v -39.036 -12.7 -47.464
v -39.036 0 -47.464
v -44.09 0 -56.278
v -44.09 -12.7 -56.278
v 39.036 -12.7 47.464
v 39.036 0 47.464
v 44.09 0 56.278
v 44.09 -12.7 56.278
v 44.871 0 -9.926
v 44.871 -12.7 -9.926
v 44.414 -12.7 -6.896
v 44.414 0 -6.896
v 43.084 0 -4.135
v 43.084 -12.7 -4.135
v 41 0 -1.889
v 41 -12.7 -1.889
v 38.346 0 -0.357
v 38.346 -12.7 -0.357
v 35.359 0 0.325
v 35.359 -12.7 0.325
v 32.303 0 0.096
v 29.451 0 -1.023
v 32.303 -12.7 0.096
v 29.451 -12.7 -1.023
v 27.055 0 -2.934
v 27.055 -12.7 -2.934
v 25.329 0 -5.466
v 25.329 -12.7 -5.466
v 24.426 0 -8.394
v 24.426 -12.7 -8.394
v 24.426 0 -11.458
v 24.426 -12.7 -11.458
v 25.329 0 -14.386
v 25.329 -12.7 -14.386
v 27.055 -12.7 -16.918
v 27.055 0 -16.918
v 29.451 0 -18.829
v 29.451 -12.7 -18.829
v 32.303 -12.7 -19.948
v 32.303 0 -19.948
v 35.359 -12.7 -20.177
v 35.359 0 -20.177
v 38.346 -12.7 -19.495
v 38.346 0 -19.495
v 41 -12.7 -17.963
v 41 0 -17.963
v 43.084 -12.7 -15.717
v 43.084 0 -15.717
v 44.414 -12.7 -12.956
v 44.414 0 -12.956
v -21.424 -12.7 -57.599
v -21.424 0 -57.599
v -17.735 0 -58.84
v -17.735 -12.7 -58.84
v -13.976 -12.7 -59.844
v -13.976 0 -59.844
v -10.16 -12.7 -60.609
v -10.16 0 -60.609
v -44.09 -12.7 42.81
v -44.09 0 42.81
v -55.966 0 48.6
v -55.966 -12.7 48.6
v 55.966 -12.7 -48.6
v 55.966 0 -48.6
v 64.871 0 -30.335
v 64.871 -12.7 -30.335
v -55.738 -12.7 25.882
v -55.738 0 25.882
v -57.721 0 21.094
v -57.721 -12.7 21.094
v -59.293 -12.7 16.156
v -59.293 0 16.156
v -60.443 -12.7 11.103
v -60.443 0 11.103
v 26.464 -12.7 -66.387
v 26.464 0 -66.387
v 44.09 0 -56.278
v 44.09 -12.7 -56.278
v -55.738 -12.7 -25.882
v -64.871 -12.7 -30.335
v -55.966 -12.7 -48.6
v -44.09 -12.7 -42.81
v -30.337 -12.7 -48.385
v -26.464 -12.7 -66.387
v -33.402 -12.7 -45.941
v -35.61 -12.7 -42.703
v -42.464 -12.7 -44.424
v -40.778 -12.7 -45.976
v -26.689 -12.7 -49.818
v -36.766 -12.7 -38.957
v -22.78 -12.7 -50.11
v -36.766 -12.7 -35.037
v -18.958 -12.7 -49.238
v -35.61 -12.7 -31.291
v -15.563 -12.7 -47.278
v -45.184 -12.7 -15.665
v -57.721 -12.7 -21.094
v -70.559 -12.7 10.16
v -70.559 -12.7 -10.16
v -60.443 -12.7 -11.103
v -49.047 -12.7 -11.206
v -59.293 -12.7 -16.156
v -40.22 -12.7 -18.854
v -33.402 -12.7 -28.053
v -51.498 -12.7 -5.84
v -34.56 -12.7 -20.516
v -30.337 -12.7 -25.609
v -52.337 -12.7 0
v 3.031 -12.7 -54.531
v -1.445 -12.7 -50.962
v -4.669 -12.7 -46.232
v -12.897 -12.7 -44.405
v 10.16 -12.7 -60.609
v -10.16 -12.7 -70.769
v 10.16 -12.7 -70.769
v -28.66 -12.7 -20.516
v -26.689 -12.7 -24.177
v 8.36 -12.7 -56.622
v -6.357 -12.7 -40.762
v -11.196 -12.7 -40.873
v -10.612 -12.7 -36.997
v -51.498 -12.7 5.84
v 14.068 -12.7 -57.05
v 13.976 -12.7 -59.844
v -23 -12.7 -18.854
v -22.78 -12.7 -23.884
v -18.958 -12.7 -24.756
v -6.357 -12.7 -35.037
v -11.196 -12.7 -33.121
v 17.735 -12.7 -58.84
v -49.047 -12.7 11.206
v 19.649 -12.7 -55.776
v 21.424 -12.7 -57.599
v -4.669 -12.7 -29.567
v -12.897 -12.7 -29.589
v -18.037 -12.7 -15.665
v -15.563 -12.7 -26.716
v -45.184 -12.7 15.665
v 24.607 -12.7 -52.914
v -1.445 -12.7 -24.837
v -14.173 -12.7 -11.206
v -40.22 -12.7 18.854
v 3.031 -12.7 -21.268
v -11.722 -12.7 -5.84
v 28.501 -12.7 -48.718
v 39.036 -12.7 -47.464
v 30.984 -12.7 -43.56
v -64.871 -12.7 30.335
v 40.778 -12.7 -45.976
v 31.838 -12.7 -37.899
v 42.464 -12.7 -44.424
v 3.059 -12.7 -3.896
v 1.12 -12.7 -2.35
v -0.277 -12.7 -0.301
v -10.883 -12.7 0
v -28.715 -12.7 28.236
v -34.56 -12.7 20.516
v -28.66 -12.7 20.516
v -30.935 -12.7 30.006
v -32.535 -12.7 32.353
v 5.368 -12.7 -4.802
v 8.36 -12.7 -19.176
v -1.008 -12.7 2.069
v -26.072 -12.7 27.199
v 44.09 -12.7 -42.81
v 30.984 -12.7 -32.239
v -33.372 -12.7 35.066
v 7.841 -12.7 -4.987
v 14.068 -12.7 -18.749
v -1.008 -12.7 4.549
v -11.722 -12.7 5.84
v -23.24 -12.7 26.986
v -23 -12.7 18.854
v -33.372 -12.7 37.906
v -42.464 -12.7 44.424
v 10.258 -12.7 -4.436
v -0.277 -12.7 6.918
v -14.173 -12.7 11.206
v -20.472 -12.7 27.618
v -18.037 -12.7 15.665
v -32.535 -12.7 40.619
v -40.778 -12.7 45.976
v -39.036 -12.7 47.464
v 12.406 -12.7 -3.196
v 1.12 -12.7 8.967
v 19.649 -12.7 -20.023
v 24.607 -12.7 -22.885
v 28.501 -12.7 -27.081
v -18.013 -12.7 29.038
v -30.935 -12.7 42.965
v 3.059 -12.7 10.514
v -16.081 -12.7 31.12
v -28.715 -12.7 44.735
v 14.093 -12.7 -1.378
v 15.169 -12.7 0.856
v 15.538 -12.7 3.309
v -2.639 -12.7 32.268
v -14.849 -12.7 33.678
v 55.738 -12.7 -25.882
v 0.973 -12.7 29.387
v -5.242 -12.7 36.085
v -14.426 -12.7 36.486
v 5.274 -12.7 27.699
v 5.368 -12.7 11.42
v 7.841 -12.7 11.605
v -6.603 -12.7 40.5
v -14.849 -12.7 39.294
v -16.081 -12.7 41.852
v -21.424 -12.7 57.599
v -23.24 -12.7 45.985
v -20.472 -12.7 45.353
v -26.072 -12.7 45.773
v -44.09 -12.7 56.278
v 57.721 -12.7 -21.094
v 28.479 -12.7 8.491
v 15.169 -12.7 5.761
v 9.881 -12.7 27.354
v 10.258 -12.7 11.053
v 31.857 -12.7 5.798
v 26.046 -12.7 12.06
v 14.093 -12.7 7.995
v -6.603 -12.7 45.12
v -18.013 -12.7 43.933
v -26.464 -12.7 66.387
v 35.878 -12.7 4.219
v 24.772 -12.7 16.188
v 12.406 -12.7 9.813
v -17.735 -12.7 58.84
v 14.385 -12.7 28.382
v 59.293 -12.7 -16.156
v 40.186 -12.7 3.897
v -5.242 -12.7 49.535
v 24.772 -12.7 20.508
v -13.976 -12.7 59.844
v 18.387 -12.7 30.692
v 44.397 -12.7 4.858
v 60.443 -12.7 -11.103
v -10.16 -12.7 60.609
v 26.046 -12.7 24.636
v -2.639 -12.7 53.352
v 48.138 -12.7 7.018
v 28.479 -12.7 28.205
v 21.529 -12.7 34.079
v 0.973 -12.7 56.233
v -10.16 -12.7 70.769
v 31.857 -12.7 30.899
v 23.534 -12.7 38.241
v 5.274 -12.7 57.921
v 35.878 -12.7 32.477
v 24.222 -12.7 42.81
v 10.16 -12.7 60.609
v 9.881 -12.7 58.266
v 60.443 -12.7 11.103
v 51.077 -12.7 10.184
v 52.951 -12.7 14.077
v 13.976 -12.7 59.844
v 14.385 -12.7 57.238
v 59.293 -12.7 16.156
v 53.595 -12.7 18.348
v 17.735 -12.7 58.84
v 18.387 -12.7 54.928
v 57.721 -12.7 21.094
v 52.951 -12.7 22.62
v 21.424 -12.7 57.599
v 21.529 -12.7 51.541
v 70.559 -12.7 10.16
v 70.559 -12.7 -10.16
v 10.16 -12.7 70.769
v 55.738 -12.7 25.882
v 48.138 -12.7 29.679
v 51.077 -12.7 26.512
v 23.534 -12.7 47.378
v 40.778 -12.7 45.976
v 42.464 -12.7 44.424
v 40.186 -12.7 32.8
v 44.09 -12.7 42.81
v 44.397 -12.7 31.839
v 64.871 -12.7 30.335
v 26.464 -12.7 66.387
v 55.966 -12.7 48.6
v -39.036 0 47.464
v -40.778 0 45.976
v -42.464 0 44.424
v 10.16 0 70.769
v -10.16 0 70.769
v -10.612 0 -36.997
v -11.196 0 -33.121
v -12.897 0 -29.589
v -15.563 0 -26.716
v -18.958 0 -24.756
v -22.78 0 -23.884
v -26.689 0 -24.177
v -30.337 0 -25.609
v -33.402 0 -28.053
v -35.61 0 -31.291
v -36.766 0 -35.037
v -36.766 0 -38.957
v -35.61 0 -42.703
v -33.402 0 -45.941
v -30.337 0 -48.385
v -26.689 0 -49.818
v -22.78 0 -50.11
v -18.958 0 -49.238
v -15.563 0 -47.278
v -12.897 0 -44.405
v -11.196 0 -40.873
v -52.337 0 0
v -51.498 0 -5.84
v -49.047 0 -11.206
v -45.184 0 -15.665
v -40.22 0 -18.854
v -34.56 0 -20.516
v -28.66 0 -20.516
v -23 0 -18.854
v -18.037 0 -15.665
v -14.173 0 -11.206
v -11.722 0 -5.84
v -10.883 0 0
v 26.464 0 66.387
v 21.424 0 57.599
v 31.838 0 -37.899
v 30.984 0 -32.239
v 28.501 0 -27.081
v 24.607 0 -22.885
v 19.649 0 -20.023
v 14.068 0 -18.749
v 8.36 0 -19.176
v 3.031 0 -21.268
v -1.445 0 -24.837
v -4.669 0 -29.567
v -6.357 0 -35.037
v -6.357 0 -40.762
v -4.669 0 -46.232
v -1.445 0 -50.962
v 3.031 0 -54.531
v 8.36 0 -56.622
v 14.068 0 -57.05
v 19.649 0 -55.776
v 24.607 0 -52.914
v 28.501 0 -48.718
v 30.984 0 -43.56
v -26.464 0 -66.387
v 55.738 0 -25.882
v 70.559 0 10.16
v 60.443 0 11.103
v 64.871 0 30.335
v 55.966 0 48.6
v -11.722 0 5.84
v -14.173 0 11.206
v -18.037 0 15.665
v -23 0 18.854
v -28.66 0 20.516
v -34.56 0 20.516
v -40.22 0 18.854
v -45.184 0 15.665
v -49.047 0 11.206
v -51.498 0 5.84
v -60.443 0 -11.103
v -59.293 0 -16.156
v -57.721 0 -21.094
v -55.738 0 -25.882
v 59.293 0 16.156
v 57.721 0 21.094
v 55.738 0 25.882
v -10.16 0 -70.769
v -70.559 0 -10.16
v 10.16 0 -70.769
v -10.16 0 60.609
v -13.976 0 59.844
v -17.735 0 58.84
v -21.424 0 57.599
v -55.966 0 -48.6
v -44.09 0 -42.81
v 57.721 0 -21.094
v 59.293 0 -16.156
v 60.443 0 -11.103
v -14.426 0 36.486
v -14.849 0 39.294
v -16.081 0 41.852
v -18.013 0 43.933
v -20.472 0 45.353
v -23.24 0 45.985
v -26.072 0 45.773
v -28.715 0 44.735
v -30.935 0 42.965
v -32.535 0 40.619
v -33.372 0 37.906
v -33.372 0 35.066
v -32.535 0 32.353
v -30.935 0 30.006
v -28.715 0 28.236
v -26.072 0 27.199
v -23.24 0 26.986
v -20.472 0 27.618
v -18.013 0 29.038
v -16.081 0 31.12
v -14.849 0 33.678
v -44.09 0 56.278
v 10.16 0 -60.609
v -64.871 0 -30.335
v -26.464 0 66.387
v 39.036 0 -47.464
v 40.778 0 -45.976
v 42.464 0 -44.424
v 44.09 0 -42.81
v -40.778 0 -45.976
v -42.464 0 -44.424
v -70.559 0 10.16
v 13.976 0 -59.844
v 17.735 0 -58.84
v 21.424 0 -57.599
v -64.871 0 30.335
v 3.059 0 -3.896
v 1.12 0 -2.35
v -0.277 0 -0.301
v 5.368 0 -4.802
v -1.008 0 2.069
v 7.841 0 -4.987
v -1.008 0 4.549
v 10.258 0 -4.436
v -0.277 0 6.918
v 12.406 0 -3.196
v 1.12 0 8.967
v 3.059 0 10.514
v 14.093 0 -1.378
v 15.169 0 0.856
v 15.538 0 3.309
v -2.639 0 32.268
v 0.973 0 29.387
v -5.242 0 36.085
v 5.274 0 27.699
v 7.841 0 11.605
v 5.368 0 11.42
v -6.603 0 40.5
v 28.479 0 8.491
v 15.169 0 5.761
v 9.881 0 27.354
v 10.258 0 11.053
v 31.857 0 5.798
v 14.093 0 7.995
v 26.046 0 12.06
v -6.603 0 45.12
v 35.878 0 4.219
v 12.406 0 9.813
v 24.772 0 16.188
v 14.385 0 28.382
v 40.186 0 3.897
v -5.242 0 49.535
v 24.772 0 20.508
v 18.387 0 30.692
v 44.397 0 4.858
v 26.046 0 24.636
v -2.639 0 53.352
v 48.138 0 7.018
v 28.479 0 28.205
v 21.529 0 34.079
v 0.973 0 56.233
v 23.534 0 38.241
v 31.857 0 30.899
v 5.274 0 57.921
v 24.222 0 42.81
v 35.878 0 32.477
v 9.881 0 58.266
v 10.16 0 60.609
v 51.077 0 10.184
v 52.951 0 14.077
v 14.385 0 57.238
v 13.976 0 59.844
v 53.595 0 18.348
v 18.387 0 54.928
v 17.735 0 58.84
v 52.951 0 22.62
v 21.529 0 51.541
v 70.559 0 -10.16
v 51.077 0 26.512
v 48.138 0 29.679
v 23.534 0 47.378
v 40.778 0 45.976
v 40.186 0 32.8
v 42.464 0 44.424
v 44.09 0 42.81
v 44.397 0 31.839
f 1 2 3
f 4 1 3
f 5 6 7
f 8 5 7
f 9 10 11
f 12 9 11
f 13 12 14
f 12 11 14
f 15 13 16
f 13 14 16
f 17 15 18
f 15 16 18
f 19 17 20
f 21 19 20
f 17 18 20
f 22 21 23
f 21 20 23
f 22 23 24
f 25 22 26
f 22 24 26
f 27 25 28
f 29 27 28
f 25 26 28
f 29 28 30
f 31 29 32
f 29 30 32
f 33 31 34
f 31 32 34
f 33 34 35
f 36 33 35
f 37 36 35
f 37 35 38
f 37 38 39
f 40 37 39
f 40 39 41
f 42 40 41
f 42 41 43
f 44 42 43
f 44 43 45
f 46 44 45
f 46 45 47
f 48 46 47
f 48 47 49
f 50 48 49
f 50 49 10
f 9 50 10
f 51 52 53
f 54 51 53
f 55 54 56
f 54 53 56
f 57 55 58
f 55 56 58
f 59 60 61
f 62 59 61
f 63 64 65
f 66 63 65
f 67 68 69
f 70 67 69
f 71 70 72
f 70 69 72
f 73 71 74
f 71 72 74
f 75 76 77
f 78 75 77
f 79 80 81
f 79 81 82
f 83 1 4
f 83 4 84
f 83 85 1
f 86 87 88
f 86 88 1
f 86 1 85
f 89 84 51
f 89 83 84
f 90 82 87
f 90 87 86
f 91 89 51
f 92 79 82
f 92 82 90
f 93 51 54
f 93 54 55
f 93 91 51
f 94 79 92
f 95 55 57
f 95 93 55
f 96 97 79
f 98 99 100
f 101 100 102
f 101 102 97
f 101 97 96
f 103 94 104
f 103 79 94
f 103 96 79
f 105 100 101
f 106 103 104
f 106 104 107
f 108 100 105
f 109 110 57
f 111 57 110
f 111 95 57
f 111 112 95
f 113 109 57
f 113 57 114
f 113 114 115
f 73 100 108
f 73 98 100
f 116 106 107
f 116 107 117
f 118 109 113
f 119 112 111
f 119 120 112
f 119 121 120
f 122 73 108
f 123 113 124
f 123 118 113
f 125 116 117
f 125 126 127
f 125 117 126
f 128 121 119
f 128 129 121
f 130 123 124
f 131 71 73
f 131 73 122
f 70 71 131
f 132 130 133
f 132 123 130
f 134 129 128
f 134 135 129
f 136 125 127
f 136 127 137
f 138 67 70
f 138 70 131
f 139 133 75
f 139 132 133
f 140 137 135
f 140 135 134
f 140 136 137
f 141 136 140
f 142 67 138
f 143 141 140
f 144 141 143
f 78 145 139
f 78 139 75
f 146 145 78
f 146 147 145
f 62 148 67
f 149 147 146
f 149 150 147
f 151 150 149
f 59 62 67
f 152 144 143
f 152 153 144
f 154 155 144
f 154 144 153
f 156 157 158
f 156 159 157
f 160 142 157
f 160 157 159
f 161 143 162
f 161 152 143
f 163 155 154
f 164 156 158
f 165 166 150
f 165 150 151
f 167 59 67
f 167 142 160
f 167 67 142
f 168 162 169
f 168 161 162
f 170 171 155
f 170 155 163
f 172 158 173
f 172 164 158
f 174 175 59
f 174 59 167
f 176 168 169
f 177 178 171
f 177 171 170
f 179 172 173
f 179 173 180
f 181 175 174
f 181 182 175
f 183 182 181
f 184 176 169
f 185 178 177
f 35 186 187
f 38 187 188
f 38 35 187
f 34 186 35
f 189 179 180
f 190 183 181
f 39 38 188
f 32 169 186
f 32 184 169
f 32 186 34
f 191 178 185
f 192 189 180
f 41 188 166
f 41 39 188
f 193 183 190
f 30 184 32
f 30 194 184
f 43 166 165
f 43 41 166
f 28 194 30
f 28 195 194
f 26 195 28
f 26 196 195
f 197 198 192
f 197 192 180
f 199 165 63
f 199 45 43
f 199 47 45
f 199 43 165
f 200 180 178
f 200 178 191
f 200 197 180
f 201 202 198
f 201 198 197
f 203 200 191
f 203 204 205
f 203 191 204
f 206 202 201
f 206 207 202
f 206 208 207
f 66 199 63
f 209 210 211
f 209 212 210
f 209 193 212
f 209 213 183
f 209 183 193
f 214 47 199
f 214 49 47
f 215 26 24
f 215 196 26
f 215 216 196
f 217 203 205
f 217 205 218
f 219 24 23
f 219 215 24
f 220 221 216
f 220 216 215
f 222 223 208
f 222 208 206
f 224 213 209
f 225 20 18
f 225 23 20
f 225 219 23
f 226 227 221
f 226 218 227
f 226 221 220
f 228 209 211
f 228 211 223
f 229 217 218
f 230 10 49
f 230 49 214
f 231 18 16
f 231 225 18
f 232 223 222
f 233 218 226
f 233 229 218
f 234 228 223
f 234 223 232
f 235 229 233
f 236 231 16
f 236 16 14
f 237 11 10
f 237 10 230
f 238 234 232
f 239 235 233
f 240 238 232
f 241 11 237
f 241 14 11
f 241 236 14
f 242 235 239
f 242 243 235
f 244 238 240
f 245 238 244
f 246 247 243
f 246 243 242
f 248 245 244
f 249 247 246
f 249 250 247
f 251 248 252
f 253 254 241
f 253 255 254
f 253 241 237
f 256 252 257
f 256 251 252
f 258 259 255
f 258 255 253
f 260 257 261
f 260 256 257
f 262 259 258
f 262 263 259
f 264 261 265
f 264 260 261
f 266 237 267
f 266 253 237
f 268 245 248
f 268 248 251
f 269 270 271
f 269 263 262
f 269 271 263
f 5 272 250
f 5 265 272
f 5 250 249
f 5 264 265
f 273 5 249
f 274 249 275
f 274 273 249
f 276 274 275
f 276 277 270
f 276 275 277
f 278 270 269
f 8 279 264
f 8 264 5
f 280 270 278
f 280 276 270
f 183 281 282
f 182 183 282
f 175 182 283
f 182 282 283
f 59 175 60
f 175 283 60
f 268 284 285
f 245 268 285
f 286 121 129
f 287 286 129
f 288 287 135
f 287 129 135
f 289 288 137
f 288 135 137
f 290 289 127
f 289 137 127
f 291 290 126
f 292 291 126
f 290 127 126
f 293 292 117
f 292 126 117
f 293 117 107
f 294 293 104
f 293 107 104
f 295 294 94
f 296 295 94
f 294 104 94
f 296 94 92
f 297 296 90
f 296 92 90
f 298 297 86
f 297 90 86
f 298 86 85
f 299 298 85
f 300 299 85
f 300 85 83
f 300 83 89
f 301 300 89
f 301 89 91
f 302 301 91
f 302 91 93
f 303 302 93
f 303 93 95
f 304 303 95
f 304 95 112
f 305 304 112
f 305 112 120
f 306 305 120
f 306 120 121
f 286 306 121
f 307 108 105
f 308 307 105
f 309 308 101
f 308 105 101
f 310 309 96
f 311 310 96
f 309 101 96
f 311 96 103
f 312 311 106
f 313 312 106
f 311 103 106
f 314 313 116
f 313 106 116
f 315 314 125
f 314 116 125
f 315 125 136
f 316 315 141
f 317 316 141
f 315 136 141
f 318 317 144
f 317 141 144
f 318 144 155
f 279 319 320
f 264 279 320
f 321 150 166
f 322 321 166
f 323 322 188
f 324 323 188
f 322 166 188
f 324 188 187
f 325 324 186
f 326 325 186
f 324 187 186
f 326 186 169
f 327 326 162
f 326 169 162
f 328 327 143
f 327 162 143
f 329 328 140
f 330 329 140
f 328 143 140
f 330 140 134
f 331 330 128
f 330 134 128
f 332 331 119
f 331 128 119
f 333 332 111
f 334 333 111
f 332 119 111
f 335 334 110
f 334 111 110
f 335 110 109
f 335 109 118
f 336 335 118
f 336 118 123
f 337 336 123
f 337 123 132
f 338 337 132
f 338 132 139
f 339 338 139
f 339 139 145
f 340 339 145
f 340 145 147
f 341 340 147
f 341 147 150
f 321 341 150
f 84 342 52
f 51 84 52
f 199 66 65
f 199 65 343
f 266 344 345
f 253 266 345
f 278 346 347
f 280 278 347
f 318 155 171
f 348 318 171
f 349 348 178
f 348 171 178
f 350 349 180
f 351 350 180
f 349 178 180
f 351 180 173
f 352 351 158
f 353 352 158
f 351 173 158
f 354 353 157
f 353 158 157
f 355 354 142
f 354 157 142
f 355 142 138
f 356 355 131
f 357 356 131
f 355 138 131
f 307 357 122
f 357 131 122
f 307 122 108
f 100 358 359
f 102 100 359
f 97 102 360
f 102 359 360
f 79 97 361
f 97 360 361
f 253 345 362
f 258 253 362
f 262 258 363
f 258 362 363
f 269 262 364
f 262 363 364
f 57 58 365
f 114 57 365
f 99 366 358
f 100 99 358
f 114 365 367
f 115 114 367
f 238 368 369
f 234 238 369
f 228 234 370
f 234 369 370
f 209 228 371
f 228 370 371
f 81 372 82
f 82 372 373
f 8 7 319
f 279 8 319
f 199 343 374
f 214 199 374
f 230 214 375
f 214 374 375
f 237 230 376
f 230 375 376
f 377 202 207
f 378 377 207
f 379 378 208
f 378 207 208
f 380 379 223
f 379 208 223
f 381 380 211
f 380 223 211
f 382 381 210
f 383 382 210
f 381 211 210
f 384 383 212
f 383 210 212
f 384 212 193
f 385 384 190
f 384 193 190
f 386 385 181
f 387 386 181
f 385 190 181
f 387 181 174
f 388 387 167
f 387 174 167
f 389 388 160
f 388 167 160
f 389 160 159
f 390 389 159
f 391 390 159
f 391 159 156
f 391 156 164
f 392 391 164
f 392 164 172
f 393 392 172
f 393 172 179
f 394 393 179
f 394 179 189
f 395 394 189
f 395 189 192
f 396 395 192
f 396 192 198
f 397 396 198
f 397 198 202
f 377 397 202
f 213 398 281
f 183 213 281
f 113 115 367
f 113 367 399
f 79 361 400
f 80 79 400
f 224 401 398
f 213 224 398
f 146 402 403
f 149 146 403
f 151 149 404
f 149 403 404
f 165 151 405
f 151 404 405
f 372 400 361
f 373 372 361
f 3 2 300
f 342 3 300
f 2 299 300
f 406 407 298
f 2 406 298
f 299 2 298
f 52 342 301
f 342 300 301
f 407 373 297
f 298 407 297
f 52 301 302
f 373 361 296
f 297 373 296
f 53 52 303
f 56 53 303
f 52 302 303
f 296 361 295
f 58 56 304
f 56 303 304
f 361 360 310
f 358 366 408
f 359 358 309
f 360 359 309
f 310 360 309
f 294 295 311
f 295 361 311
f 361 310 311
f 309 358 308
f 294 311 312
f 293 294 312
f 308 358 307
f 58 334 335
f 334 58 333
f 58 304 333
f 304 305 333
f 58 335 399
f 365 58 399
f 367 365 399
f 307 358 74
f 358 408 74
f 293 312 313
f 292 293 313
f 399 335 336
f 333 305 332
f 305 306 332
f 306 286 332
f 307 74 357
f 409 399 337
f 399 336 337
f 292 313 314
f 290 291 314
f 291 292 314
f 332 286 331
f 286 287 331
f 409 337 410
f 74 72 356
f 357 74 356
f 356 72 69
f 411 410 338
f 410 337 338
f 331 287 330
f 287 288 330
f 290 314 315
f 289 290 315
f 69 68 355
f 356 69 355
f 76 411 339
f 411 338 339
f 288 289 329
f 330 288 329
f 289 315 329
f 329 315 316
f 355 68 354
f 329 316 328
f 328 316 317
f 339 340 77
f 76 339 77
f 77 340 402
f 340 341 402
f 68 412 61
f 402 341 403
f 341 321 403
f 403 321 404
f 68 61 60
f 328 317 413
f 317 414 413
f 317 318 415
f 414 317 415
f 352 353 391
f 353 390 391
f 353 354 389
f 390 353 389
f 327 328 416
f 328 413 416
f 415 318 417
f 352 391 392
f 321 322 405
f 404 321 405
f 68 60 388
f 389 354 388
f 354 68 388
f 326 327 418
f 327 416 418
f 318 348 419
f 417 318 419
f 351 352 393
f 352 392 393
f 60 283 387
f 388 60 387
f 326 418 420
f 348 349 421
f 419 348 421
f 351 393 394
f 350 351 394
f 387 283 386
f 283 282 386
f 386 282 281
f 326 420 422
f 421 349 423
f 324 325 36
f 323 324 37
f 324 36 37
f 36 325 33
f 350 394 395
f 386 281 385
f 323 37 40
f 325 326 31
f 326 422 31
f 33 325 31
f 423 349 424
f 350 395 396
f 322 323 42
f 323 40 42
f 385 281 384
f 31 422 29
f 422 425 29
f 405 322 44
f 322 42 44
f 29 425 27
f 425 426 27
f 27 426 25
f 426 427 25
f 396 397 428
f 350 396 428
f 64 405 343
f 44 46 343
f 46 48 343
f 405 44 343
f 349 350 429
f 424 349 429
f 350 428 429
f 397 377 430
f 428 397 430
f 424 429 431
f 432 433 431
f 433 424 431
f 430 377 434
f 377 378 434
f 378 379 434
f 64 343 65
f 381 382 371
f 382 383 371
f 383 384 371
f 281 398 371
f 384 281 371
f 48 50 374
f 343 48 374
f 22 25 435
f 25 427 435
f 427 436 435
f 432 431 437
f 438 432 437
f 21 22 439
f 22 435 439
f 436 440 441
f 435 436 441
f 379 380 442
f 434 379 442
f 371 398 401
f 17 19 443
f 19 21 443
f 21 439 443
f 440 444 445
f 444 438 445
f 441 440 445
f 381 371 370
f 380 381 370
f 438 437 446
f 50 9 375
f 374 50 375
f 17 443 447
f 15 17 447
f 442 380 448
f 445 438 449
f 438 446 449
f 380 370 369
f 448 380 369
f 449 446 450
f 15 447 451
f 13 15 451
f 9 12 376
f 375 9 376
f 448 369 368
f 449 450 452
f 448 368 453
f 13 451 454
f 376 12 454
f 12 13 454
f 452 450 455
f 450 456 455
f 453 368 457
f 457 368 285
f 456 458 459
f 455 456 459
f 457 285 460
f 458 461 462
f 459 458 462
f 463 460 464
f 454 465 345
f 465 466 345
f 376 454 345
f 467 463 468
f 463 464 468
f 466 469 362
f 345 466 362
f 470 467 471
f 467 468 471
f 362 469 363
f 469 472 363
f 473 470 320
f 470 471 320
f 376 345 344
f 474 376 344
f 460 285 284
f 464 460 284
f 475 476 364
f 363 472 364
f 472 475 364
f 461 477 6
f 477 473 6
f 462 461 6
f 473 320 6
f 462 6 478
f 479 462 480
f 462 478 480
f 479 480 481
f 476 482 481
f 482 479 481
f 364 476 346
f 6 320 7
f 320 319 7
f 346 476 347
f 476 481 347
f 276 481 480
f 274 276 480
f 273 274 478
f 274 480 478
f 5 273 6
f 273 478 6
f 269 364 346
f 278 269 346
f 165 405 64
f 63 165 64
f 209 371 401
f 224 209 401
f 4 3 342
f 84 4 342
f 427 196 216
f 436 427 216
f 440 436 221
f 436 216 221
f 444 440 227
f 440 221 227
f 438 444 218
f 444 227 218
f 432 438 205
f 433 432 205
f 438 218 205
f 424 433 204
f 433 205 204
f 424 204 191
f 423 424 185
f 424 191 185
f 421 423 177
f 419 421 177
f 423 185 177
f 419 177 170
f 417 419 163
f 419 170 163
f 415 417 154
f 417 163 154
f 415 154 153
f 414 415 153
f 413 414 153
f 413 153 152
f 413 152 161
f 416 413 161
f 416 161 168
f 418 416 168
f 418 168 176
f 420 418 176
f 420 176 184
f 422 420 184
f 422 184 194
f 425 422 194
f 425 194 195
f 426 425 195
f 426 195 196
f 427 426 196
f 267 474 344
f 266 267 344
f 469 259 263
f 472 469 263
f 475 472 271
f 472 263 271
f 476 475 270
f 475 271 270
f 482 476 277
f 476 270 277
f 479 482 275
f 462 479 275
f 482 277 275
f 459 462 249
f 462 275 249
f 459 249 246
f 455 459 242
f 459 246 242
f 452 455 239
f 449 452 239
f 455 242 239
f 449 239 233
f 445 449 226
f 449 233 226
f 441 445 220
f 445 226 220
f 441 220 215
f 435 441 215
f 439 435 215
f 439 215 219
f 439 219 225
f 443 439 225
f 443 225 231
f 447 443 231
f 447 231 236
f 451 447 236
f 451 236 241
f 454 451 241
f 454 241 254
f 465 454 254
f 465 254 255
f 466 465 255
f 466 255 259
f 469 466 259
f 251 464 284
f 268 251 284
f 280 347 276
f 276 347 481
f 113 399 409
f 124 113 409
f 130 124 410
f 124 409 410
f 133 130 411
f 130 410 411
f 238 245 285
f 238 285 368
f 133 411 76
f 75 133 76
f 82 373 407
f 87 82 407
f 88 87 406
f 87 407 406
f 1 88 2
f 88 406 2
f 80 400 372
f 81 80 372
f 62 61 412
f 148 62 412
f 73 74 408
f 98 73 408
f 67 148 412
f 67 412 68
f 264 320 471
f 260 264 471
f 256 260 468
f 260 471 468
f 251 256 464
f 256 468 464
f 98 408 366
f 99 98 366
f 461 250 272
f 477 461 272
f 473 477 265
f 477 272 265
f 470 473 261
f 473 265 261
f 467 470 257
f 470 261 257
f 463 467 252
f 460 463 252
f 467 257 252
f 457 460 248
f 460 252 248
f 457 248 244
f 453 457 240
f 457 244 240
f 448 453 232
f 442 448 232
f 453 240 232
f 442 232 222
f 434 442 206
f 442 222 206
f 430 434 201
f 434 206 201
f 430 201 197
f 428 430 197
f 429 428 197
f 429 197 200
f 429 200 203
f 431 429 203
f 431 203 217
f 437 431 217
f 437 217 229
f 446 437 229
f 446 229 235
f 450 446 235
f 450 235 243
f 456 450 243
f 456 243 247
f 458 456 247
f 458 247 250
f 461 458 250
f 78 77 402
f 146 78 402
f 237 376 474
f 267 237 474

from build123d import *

# Parameters (mm, degrees)
F1_DEPTH = 12.7
F3_DEPTH = 25.4
F4_DEPTH = 25.4
F5_R     = 9.525927
F5_R_2   = 15.499369
F5_R_3   = 13.150127
F5_R_4   = 19.204473
F5_R_5   = 8.319425
F6_DEPTH = 25.4
F7_R     = 14.492161
F7_R_2   = 10.279788
F8_DEPTH = 25.4


with BuildPart() as f1:
    # F0 (on Front) → F1 (new body)
    with BuildSketch(Plane.XZ):
        with BuildLine():
            Line((-64.870612, 30.334717), (-55.738205, 25.88222))
            ThreePointArc((-55.738205, 25.88222), (-58.558762, 18.64157), (-60.443056, 11.102871))
            Line((-60.443056, 11.102871), (-70.559211, 10.16))
            Line((-70.559211, 10.16), (-70.559211, 0))
            Line((-70.559211, 0), (-70.559211, -10.16))
            Line((-70.559211, -10.16), (-60.443056, -11.102871))
            ThreePointArc((-60.443056, -11.102871), (-58.558762, -18.64157), (-55.738205, -25.88222))
            Line((-55.738205, -25.88222), (-64.870612, -30.334717))
            Line((-64.870612, -30.334717), (-55.965618, -48.599532))
            Line((-55.965618, -48.599532), (-44.09037, -42.809766))
            ThreePointArc((-44.09037, -42.809766), (-41.628099, -45.207722), (-39.035619, -47.464273))
            Line((-39.035619, -47.464273), (-44.09037, -56.27762))
            Line((-44.09037, -56.27762), (-26.463675, -66.387122))
            Line((-26.463675, -66.387122), (-21.423516, -57.599216))
            ThreePointArc((-21.423516, -57.599216), (-15.863285, -59.371651), (-10.16, -60.608672))
            Line((-10.16, -60.608672), (-10.16, -70.768672))
            Line((-10.16, -70.768672), (0, -70.768672))
            Line((0, -70.768672), (10.16, -70.768672))
            Line((10.16, -70.768672), (10.16, -60.608672))
            ThreePointArc((10.16, -60.608672), (15.863285, -59.371651), (21.423516, -57.599216))
            Line((21.423516, -57.599216), (26.463675, -66.387122))
            Line((26.463675, -66.387122), (44.09037, -56.27762))
            Line((44.09037, -56.27762), (39.035619, -47.464273))
            ThreePointArc((39.035619, -47.464273), (41.628099, -45.207722), (44.09037, -42.809766))
            Line((44.09037, -42.809766), (55.965618, -48.599532))
            Line((55.965618, -48.599532), (64.870612, -30.334717))
            Line((64.870612, -30.334717), (55.738205, -25.88222))
            ThreePointArc((55.738205, -25.88222), (58.558762, -18.64157), (60.443056, -11.102871))
            Line((60.443056, -11.102871), (70.559211, -10.16))
            Line((70.559211, -10.16), (70.559211, 0))
            Line((70.559211, 0), (70.559211, 10.16))
            Line((70.559211, 10.16), (60.443056, 11.102871))
            ThreePointArc((60.443056, 11.102871), (58.558762, 18.64157), (55.738205, 25.88222))
            Line((55.738205, 25.88222), (64.870612, 30.334717))
            Line((64.870612, 30.334717), (55.965618, 48.599532))
            Line((55.965618, 48.599532), (44.09037, 42.809766))
            ThreePointArc((44.09037, 42.809766), (41.628099, 45.207722), (39.035619, 47.464273))
            Line((39.035619, 47.464273), (44.09037, 56.27762))
            Line((44.09037, 56.27762), (26.463675, 66.387122))
            Line((26.463675, 66.387122), (21.423516, 57.599216))
            ThreePointArc((21.423516, 57.599216), (15.863285, 59.371651), (10.16, 60.608672))
            Line((10.16, 60.608672), (10.16, 70.768672))
            Line((10.16, 70.768672), (0, 70.768672))
            Line((0, 70.768672), (-10.16, 70.768672))
            Line((-10.16, 70.768672), (-10.16, 60.608672))
            ThreePointArc((-10.16, 60.608672), (-15.863285, 59.371651), (-21.423516, 57.599216))
            Line((-21.423516, 57.599216), (-26.463675, 66.387122))
            Line((-26.463675, 66.387122), (-44.09037, 56.27762))
            Line((-44.09037, 56.27762), (-39.035619, 47.464273))
            ThreePointArc((-39.035619, 47.464273), (-41.628099, 45.207722), (-44.09037, 42.809766))
            Line((-44.09037, 42.809766), (-55.965618, 48.599532))
            Line((-55.965618, 48.599532), (-64.870612, 30.334717))
        make_face()
    extrude(amount=F1_DEPTH)

    # F2 (on face) → F3 (cut)
    with BuildSketch(Plane.XZ.offset(12.7)):
        with BuildLine():
            ThreePointArc((-52.337367, 0), (-31.610057, -20.72731), (-10.882746, 0))
            ThreePointArc((-10.882746, 0), (-31.610057, 20.72731), (-52.337367, 0))
        make_face()
    extrude(amount=-F3_DEPTH, mode=Mode.SUBTRACT)

    # F2 (on face) → F4 (cut)
    with BuildSketch(Plane.XZ.offset(12.7)):
        with BuildLine():
            ThreePointArc((-52.337367, 0), (-31.610057, -20.72731), (-10.882746, 0))
            ThreePointArc((-10.882746, 0), (-31.610057, 20.72731), (-52.337367, 0))
        make_face()
    extrude(amount=-F4_DEPTH, mode=Mode.SUBTRACT)

    # F5 (on face) → F6 (cut)
    with BuildSketch(Plane.XZ.offset(12.7)):
        with Locations((-23.951983, 36.485761)):
            Circle(F5_R)
        with Locations((8.722895, 42.809766)):
            Circle(F5_R_2)
        with Locations((-23.76237, -36.997106)):
            Circle(F5_R_3)
        with Locations((12.633157, -37.899476)):
            Circle(F5_R_4)
        with Locations((7.218948, 3.308684)):
            Circle(F5_R_5)
    extrude(amount=-F6_DEPTH, mode=Mode.SUBTRACT)

    # F7 (on face) → F8 (cut)
    with BuildSketch(Plane.XZ.offset(12.7)):
        with Locations((39.102633, 18.348159)):
            Circle(F7_R)
        with Locations((34.590792, -9.926053)):
            Circle(F7_R_2)
    extrude(amount=-F8_DEPTH, mode=Mode.SUBTRACT)


solid = f1.part
